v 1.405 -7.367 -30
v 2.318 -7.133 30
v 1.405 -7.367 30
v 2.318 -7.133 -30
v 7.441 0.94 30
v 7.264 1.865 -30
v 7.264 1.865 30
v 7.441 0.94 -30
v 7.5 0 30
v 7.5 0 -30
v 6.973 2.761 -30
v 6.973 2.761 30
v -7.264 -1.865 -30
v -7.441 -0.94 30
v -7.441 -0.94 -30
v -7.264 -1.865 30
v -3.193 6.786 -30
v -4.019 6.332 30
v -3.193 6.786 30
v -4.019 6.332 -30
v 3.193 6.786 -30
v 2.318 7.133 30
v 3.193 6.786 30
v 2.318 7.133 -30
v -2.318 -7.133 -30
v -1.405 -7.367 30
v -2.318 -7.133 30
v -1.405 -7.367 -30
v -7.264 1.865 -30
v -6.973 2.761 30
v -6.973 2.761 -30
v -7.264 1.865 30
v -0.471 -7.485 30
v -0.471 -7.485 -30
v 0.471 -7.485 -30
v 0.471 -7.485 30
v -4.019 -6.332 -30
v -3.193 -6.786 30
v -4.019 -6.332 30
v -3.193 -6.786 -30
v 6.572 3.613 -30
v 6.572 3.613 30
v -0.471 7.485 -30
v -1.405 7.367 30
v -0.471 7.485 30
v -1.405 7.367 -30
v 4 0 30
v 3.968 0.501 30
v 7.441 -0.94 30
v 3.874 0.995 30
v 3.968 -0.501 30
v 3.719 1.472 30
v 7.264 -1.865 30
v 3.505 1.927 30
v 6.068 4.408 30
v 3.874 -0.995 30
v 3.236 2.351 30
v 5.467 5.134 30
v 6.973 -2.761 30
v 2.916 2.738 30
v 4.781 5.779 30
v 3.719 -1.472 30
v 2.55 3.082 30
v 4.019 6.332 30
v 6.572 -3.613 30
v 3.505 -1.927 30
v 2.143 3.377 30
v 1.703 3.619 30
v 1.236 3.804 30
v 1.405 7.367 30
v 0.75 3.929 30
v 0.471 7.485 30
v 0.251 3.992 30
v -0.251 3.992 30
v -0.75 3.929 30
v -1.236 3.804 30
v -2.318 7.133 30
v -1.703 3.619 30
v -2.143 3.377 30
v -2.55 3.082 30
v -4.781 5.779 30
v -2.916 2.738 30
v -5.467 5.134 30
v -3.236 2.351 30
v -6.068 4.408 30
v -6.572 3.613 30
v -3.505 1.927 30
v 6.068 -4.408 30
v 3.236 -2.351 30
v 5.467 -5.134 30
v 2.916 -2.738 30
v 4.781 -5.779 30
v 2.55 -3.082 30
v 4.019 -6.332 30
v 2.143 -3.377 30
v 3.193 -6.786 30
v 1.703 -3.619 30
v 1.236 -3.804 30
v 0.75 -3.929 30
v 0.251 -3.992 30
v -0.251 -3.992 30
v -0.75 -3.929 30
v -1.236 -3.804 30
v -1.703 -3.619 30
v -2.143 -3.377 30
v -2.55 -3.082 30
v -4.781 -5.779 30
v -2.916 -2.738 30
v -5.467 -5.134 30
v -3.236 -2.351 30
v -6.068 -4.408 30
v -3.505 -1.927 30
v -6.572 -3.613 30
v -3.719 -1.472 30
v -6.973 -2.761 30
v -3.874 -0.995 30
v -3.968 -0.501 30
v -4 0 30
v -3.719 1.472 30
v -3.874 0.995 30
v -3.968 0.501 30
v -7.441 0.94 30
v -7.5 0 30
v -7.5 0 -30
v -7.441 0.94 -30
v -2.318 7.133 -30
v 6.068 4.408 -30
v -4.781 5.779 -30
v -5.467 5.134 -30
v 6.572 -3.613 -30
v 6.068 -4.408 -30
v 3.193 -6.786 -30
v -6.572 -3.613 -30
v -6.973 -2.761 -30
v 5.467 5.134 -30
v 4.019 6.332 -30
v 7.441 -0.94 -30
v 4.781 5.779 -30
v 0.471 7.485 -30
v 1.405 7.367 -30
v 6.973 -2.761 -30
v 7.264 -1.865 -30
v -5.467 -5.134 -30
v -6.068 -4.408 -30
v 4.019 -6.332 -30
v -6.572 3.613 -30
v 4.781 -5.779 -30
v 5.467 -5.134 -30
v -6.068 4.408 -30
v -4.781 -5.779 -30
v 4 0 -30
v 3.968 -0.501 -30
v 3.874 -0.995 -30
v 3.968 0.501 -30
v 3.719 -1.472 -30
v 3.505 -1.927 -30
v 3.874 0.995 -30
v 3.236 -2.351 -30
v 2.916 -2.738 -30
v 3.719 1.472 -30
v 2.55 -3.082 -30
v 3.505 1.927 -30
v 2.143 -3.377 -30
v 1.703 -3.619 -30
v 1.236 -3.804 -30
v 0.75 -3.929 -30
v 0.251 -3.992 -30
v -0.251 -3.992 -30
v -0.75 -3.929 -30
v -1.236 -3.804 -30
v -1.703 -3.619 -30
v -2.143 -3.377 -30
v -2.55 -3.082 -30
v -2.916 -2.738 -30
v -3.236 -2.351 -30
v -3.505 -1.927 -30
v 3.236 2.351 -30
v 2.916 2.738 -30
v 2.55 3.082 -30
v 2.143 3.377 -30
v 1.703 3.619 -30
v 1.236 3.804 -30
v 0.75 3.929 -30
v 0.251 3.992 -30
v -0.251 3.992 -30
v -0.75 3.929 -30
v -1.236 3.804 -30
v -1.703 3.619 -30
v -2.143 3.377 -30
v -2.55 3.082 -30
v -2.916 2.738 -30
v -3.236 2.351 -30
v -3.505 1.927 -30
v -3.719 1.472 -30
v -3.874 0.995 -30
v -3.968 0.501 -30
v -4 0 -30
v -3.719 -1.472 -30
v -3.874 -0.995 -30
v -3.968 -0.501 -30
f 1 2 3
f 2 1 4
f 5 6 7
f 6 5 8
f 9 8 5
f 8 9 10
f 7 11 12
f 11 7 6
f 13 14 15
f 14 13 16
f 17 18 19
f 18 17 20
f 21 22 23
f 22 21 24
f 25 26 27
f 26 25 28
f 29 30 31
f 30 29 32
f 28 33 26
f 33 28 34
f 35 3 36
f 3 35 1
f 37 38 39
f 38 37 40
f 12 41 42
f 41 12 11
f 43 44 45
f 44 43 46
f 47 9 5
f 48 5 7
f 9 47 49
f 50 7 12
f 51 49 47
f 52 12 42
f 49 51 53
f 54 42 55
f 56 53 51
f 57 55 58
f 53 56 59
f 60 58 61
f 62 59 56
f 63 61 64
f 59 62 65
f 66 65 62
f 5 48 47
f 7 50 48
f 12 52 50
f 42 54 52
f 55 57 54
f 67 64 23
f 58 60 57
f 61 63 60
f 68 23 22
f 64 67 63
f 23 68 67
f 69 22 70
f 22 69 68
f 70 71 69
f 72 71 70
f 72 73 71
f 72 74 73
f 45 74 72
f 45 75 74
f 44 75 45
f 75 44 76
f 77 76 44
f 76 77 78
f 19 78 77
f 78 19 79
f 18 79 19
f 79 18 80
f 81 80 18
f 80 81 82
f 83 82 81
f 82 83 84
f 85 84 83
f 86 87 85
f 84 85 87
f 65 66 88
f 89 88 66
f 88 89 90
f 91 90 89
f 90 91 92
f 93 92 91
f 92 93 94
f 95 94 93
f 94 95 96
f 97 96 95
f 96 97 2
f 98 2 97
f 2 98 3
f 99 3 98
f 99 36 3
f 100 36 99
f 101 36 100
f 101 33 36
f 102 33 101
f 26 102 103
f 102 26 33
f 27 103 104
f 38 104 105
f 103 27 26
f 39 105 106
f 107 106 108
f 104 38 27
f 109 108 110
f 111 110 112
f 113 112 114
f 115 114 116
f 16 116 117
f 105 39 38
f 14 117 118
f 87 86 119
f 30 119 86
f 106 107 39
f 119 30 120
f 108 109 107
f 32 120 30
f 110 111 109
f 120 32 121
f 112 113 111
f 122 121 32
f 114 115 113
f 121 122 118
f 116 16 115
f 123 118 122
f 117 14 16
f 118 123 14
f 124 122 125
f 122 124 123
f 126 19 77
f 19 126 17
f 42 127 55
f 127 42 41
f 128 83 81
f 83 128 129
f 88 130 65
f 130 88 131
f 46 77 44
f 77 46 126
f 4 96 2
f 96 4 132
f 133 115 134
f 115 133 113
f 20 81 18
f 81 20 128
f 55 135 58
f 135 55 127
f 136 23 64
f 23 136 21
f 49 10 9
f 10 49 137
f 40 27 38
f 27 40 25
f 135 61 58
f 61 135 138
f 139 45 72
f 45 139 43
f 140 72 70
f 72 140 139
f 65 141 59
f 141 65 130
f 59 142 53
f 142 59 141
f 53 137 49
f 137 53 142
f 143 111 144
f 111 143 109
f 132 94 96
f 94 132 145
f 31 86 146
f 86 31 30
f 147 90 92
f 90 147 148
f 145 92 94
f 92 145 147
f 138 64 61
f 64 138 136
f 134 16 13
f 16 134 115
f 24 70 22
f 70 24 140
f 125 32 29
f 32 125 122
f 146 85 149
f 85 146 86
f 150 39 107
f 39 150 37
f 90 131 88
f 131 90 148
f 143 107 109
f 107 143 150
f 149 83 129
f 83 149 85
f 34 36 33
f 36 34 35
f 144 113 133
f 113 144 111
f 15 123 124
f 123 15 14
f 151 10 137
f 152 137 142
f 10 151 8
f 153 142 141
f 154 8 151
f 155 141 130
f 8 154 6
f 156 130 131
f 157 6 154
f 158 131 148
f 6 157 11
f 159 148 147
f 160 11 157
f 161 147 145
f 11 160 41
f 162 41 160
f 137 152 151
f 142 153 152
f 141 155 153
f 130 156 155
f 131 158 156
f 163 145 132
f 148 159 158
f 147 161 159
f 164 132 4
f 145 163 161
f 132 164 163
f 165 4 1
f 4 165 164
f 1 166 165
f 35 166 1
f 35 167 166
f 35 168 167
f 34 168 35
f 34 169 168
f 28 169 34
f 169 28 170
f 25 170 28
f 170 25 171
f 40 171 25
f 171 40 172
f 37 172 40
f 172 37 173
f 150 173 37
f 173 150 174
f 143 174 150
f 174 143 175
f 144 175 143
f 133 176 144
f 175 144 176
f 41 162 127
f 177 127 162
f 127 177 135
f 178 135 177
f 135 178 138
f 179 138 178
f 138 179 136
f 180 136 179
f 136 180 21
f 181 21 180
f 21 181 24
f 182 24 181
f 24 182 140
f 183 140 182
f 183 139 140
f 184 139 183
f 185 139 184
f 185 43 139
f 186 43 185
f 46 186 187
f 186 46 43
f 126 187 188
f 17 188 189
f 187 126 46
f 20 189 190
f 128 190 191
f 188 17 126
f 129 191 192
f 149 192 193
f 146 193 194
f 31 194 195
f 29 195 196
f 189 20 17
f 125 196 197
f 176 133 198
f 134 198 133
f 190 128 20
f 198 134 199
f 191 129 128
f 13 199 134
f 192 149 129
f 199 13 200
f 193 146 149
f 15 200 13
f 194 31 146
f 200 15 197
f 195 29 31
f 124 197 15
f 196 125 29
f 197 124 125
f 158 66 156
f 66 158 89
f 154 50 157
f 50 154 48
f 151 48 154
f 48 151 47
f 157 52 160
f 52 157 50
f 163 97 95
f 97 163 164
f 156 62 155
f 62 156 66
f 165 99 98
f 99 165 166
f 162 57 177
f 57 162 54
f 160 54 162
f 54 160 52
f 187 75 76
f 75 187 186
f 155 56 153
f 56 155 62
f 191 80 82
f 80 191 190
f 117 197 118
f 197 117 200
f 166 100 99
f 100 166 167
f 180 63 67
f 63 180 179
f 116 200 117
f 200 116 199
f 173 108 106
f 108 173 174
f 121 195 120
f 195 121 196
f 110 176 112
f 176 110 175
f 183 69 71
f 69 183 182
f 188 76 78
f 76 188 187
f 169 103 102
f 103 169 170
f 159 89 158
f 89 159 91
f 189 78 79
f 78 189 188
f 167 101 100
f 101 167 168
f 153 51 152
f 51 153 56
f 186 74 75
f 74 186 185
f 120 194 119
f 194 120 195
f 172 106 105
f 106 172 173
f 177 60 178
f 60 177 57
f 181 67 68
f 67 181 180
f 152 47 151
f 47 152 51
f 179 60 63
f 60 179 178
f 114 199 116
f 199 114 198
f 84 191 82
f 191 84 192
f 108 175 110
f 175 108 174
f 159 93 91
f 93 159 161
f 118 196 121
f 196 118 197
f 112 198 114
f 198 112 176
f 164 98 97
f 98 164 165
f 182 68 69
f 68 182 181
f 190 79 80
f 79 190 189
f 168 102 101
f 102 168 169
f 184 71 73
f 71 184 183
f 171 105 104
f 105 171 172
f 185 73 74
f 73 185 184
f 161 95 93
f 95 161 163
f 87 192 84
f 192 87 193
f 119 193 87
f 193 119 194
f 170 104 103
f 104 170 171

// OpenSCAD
$fn = 50;


difference() {
	union() {
		translate(v = [0, 0, -30.0000000000]) {
			cylinder(h = 60, r = 7.5000000000);
		}
	}
	union() {
		translate(v = [0, 0, -100.0000000000]) {
			cylinder(h = 200, r = 4.0000000000);
		}
	}
}
